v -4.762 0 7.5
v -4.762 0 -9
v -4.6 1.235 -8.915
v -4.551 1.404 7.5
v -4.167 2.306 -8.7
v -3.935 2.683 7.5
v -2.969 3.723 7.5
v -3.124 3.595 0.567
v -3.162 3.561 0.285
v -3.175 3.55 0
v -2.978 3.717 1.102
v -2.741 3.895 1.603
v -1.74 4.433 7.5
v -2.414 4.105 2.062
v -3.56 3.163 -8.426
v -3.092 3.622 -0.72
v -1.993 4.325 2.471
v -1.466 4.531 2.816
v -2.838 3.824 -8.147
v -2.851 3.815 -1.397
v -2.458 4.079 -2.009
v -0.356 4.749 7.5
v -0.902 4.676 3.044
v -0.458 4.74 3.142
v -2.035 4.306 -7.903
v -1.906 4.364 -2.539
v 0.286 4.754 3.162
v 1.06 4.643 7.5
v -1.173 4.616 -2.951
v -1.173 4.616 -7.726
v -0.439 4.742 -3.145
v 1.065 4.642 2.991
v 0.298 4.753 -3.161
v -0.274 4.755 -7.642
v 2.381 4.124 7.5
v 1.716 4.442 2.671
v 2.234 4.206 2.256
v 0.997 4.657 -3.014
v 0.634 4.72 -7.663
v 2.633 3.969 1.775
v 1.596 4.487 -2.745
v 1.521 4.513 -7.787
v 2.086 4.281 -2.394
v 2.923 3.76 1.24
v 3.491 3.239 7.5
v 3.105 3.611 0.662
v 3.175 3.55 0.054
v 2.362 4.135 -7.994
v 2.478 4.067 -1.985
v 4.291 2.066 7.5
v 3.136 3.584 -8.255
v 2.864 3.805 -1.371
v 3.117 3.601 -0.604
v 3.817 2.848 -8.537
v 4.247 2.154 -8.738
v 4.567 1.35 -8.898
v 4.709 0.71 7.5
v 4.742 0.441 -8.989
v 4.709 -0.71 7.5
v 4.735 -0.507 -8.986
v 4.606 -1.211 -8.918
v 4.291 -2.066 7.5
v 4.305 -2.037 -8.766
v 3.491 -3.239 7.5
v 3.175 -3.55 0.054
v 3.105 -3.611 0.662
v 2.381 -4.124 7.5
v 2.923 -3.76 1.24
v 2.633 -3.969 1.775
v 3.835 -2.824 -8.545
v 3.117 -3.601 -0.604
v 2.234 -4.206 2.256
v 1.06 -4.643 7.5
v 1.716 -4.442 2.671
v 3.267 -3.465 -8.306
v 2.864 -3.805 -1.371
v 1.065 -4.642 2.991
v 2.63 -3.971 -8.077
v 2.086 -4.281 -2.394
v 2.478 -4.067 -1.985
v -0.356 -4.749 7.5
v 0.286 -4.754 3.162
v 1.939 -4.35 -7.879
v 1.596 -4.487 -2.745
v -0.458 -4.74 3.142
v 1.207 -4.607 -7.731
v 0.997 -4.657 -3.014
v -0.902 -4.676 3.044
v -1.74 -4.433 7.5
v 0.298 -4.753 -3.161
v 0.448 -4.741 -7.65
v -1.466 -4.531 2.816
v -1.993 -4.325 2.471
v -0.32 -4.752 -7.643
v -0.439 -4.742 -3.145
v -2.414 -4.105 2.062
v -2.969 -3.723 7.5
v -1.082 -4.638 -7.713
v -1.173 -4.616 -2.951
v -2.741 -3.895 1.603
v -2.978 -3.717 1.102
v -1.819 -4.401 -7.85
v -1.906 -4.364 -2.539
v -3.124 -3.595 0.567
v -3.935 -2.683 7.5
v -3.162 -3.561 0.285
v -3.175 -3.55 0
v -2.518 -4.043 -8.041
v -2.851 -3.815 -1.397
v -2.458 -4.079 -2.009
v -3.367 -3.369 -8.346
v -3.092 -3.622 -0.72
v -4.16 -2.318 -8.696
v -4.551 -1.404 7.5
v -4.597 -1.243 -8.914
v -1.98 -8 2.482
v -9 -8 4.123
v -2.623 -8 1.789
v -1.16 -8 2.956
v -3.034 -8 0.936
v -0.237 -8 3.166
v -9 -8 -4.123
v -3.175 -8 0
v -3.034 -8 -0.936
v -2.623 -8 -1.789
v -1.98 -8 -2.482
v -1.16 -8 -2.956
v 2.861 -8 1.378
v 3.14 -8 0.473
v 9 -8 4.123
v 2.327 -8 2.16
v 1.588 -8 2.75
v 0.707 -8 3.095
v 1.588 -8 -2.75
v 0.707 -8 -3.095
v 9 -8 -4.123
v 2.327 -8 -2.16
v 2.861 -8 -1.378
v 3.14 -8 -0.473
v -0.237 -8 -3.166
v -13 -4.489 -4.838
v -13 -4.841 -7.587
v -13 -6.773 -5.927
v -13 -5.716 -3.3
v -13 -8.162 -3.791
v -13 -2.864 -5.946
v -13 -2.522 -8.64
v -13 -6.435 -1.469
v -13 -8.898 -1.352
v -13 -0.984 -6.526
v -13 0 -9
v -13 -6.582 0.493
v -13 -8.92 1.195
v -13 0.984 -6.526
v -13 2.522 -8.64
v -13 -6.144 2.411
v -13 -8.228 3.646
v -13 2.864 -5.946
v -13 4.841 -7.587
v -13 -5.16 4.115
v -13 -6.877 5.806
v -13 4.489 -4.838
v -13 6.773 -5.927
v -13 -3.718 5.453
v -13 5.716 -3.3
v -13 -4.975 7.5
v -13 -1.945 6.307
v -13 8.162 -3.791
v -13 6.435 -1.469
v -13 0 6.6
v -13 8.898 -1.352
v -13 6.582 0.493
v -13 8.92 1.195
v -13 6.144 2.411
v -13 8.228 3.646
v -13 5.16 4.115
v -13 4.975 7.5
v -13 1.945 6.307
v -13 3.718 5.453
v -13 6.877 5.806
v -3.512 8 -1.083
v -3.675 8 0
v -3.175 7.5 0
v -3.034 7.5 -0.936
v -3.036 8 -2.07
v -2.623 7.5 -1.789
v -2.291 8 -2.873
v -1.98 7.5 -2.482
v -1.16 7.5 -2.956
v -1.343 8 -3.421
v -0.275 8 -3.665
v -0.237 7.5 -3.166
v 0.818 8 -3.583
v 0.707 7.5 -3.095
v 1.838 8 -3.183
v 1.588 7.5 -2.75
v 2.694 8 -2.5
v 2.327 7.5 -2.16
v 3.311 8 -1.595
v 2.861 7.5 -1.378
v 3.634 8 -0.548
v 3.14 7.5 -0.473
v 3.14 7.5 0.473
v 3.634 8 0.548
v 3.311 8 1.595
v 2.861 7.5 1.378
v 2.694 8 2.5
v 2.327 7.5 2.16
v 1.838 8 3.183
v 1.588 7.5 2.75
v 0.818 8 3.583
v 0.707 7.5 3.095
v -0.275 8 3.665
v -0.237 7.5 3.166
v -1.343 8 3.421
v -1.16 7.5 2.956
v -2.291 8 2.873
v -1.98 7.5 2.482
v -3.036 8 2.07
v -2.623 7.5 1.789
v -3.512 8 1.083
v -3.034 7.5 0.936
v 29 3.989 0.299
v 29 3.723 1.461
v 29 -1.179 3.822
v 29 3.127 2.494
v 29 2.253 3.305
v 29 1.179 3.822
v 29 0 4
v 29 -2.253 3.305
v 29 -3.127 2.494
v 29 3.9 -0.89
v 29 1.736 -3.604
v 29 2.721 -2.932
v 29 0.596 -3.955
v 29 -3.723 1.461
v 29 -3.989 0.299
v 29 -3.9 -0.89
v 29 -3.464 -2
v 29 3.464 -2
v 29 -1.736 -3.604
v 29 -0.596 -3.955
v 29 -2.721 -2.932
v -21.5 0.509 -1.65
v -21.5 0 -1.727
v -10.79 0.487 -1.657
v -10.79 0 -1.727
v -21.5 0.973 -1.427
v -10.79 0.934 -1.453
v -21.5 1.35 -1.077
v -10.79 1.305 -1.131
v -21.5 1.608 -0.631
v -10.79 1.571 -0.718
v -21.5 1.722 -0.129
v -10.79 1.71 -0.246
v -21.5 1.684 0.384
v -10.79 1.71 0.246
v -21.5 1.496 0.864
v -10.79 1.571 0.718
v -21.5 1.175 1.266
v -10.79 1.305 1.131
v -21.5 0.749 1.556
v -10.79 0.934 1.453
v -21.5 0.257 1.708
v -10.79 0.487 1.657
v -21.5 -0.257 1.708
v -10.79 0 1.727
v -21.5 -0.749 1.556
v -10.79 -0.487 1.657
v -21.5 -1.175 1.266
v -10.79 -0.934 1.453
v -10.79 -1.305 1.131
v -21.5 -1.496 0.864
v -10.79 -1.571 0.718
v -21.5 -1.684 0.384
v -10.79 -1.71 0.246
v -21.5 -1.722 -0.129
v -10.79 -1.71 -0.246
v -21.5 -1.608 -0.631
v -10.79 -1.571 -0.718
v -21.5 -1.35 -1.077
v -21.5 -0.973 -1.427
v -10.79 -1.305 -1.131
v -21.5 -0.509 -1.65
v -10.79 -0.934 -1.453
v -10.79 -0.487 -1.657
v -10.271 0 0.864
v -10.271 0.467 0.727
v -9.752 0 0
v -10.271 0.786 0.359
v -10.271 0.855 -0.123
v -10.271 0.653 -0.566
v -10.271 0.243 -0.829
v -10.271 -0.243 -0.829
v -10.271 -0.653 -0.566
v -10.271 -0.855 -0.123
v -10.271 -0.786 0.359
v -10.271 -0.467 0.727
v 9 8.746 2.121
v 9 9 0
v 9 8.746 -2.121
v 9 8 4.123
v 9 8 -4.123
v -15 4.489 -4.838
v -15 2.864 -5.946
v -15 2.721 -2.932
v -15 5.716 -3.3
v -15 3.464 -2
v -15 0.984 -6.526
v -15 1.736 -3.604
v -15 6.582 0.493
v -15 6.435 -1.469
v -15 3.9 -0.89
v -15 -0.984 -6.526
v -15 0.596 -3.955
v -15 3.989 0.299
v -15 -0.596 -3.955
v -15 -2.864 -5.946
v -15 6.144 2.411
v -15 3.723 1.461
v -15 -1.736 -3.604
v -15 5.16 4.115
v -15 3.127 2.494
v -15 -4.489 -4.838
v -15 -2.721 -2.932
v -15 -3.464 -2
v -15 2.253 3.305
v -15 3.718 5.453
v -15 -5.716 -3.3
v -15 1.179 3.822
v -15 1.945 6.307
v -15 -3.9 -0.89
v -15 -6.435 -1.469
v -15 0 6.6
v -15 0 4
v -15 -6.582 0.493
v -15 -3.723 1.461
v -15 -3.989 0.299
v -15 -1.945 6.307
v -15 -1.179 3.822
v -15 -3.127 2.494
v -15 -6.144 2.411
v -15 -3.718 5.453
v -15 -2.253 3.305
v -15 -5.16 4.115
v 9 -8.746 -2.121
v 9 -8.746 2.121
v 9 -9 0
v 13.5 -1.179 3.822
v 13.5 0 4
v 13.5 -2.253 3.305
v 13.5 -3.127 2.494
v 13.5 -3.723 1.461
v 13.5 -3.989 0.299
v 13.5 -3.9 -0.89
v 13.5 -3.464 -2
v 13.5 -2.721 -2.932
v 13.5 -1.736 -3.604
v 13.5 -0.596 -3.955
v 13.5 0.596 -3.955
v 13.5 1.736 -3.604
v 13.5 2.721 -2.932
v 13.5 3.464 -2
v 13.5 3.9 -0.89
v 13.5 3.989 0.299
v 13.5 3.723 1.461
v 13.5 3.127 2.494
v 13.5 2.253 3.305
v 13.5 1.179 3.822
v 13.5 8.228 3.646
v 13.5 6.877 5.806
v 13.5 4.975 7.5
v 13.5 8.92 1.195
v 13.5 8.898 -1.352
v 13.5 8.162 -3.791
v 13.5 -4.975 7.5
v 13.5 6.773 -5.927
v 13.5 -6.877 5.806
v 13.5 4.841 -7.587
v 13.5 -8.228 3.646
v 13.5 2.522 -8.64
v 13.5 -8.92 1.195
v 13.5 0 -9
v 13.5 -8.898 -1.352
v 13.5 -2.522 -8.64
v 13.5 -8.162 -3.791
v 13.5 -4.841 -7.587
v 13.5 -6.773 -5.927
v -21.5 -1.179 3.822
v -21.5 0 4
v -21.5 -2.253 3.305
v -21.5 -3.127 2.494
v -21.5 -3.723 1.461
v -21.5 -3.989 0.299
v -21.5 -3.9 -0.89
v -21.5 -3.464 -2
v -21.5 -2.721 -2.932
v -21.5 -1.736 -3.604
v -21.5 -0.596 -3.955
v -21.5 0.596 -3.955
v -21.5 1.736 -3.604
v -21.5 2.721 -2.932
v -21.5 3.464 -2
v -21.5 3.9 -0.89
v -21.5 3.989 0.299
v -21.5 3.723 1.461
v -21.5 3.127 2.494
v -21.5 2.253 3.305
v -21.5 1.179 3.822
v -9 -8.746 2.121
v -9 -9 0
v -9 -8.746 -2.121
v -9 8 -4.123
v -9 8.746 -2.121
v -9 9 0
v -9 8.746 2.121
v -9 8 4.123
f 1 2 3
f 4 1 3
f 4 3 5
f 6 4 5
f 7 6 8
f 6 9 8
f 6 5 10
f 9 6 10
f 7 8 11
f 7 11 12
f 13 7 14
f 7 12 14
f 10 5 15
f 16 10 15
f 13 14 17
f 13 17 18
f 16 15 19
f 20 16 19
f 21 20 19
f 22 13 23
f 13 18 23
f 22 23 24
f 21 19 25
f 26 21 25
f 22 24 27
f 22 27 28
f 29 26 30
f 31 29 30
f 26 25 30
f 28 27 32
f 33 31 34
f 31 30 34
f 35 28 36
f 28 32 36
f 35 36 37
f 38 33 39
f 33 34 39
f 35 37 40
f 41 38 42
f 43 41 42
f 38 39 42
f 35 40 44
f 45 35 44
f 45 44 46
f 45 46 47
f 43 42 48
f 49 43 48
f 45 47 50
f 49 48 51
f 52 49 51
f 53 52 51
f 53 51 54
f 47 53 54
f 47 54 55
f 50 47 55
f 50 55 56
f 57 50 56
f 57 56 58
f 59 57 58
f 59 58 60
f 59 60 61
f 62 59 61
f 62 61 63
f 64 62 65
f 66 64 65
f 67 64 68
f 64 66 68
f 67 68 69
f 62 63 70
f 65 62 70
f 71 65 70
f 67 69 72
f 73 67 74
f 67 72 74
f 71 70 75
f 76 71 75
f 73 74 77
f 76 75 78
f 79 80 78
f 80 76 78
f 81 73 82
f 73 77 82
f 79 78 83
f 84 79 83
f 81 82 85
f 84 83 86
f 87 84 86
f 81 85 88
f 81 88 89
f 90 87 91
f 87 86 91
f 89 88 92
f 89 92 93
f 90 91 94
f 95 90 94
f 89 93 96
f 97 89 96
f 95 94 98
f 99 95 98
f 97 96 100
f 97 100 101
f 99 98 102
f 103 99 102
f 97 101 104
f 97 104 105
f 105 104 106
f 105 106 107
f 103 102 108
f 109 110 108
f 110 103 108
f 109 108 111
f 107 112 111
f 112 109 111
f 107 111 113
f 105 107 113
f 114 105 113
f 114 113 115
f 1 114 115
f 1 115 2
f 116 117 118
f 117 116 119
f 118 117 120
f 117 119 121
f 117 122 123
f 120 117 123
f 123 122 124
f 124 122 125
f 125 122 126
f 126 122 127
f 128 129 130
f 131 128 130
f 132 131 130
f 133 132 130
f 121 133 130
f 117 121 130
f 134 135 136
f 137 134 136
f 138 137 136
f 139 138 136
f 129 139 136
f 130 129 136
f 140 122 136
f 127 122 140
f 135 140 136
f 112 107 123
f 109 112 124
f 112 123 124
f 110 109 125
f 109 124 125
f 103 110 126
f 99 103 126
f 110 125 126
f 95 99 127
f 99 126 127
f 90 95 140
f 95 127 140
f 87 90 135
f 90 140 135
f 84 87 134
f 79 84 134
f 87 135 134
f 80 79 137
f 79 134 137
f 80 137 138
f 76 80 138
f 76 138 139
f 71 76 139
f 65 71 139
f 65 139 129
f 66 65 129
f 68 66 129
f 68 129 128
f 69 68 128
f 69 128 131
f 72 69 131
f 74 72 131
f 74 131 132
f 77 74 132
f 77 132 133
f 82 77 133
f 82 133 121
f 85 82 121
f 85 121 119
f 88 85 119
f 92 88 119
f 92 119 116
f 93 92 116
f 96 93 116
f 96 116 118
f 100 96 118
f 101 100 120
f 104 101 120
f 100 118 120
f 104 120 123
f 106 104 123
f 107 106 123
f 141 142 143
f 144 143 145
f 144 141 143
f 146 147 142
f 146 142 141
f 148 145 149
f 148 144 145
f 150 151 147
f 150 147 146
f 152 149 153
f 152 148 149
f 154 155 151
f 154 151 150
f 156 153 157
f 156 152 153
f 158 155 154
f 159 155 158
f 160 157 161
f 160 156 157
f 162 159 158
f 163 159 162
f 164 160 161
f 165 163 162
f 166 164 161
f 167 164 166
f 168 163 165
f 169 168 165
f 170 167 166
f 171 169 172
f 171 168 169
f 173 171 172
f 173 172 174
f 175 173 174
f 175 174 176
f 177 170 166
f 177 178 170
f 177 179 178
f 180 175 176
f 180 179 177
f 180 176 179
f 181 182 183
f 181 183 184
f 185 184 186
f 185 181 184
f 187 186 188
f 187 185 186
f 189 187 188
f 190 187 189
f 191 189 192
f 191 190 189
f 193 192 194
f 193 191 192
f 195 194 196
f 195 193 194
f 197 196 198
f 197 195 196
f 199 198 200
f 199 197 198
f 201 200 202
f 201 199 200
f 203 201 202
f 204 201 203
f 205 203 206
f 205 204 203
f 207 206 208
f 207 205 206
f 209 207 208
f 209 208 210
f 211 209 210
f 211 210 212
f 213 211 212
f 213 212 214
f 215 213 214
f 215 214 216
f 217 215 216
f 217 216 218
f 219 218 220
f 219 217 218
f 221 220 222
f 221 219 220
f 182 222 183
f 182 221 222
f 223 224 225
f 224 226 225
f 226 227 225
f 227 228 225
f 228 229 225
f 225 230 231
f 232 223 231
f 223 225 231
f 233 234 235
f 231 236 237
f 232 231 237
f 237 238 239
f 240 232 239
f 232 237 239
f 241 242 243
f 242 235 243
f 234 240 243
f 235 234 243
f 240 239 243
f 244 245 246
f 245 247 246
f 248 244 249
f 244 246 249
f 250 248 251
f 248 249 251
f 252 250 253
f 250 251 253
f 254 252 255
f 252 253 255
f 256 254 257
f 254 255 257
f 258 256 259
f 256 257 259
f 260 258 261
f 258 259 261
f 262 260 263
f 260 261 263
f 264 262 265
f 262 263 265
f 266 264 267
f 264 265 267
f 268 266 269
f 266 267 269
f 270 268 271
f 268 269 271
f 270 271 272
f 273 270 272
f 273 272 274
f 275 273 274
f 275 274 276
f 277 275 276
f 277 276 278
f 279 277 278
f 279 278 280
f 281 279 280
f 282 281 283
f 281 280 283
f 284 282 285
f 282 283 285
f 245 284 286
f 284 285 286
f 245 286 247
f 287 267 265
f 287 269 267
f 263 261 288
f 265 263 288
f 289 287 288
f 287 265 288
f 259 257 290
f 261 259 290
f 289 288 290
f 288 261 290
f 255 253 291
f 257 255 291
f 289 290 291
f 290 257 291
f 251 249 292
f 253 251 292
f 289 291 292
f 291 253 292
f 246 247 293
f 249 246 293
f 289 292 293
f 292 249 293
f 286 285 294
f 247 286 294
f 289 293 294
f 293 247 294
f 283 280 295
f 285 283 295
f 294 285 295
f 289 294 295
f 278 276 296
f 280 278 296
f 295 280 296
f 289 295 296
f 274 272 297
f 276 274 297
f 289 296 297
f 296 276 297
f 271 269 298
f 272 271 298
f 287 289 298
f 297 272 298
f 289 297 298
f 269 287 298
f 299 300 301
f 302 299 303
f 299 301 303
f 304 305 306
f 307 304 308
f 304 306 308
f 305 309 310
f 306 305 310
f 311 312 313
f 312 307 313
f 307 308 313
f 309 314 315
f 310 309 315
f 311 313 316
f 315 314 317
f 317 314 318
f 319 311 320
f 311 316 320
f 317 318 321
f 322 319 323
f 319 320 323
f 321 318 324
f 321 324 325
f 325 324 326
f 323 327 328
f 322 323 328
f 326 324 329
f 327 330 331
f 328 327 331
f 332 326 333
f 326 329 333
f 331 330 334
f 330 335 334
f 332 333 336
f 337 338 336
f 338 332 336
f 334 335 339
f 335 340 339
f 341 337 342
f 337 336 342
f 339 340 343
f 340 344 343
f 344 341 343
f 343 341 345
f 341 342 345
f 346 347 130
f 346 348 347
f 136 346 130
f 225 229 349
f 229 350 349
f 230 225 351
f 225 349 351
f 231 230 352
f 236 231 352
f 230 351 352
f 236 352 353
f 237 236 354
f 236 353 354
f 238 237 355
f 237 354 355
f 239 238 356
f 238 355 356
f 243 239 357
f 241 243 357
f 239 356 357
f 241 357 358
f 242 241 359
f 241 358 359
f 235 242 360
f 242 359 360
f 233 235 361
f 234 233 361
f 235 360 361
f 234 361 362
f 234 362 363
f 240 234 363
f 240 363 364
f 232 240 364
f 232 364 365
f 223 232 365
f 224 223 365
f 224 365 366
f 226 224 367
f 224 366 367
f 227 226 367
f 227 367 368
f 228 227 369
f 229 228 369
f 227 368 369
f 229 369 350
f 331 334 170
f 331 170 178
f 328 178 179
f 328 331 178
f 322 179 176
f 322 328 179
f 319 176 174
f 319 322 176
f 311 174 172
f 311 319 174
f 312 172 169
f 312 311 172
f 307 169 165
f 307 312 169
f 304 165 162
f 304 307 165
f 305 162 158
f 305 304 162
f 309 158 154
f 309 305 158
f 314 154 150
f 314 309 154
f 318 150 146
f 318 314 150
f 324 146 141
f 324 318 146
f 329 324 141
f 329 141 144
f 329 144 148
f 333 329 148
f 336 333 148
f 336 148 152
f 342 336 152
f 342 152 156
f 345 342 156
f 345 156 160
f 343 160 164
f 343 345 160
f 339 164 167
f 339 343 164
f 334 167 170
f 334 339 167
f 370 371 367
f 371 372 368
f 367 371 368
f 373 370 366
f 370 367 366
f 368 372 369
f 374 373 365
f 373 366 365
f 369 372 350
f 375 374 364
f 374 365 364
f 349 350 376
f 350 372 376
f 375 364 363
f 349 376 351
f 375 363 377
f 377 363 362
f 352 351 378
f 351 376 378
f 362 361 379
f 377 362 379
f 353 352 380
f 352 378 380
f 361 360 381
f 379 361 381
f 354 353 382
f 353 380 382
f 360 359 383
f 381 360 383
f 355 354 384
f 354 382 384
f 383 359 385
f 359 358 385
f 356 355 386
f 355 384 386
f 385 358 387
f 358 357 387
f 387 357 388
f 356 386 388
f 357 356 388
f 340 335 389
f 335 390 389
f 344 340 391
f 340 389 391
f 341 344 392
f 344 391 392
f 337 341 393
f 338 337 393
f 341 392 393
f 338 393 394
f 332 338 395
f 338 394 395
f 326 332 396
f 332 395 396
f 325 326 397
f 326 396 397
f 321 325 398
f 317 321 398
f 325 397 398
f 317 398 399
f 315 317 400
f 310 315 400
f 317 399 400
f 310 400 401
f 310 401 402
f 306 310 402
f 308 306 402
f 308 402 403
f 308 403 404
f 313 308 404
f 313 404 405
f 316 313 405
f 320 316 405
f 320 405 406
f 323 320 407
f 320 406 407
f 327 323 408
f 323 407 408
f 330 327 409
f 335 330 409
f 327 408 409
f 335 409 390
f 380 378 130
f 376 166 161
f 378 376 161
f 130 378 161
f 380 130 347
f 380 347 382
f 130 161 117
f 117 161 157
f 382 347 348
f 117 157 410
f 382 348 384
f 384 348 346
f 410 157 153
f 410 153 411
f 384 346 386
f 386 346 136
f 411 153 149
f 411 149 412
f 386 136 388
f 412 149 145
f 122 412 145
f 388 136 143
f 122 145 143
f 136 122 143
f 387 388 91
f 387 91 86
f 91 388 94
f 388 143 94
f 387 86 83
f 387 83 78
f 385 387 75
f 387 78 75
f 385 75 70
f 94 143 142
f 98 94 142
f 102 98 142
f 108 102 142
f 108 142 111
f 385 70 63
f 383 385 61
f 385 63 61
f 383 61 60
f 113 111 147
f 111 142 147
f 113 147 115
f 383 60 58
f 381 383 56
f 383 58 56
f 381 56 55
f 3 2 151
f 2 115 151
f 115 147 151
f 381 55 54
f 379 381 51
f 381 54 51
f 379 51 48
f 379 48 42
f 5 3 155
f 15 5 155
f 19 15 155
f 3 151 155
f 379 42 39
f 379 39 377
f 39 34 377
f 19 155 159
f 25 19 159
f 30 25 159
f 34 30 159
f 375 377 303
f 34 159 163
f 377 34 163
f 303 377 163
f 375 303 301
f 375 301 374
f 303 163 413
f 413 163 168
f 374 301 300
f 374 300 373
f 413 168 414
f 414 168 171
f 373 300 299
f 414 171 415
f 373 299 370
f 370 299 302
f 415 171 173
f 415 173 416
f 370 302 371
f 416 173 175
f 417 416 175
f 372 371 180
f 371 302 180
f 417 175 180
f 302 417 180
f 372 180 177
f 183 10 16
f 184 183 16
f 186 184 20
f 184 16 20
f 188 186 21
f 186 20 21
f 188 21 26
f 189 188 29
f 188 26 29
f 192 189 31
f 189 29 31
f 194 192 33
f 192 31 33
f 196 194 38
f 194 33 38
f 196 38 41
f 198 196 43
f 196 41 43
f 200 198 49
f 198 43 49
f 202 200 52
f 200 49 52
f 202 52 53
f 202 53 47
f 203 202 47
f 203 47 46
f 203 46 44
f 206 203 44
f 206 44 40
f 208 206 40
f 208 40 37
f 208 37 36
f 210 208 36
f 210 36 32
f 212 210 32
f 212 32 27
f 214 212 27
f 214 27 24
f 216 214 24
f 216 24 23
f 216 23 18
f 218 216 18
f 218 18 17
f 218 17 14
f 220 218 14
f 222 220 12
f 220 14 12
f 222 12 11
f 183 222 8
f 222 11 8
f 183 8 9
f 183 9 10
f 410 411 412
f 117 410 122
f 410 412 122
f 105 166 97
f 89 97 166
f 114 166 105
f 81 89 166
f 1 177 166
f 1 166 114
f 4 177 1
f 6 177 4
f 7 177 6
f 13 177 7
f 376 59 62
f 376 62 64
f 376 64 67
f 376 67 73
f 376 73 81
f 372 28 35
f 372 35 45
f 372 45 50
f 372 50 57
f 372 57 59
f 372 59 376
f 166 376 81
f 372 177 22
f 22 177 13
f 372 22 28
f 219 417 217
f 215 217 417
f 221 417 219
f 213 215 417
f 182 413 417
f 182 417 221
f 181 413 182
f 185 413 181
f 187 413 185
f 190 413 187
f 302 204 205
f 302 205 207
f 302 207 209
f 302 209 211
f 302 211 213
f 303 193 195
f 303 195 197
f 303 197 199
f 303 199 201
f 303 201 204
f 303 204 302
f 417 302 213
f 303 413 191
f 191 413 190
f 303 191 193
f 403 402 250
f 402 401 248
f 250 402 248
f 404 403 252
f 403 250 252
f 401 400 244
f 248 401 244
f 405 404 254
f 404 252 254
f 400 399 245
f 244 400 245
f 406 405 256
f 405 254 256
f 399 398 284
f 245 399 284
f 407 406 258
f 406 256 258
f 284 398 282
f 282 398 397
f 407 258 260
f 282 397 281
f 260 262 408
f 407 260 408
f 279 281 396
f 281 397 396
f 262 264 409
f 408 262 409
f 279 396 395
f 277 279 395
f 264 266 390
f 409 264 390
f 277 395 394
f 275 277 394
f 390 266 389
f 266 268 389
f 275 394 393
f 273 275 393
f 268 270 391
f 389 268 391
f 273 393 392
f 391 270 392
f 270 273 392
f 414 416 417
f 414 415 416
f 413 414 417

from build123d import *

# Parameters (mm, degrees)
SKETCH2_W                  = 30
SKETCH2_H                  = 12.7
CUT_EXTRUDE1_DEPTH         = 1.5
F_8_32_TAPPED_HOLE1_D      = 3.4544
F_8_32_TAPPED_HOLE1_DEPTH  = 10.71
F_8_32_TAPPED_HOLE1_TIP    = 1.037806461
SKETCH7_OUTSIDE_W          = 29.718
SKETCH7_OUTSIDE_H          = 31.218
SKETCH7_OUTSIDE_R          = 6.6
CUT_EXTRUDE2_DEPTH         = 2
F_3_8_0_3750_DOWEL_HOLE2_D = 9.525
CUT_EXTRUDE4_START         = 9
SKETCH11_W                 = 18
SKETCH11_H                 = 20
CUT_EXTRUDE4_DEPTH         = 1
F_1_4_0_2500_DOWEL_HOLE1_D = 6.35
CHAMFER1_SIZE              = 0.5


with BuildPart() as part:
    # Sketch1 → Revolve1 (revolve)
    with BuildSketch(Plane(origin=(0, 0, 0), x_dir=(1, 0, 0), z_dir=(0, 1, 0)), mode=Mode.PRIVATE) as revolve1_sk:
        Polygon((-21.5, 0), (29, 0), (29, 4), (13.5, 4), (13.5, 9), (-15, 9), (-15, 4), (-21.5, 4), align=None)
    revolve(revolve1_sk.sketch.rotate(Axis((-21.5, 0, 0), (1, 0, 0)), 180), axis=Axis((-21.5, 0, 0), (1, 0, 0)))

    # Sketch2 → Cut-Extrude1 (cut)
    with BuildSketch(Plane.XY.offset(9)):
        Rectangle(SKETCH2_W, SKETCH2_H)
    extrude(amount=-CUT_EXTRUDE1_DEPTH, mode=Mode.SUBTRACT)

    # #8-32 Tapped Hole1
    with Locations(Plane.ZY.offset(21.5)):
        with Locations((0, 0)):
            Hole(F_8_32_TAPPED_HOLE1_D / 2, depth=F_8_32_TAPPED_HOLE1_DEPTH)
            with Locations((0, 0, -(F_8_32_TAPPED_HOLE1_DEPTH + F_8_32_TAPPED_HOLE1_TIP / 2))):  # 118° drill point
                Cone(0, F_8_32_TAPPED_HOLE1_D / 2, F_8_32_TAPPED_HOLE1_TIP, mode=Mode.SUBTRACT)

    # Sketch7 outside → Cut-Extrude2 (cut)
    with BuildSketch(Plane.ZY.offset(15)):
        with Locations((-0.75, 0)):
            Rectangle(SKETCH7_OUTSIDE_W, SKETCH7_OUTSIDE_H)
        Circle(SKETCH7_OUTSIDE_R, mode=Mode.SUBTRACT)
    extrude(amount=-CUT_EXTRUDE2_DEPTH, mode=Mode.SUBTRACT)

    # 3/8 (0.3750) Dowel Hole2 (through all)
    with Locations(Plane.XY.offset(7.5)):
        with Locations((0, 0)):
            Hole(F_3_8_0_3750_DOWEL_HOLE2_D / 2)

    # Sketch11 → Cut-Extrude4 (cut)
    with BuildSketch(Plane(origin=(0, 0, 0), x_dir=(1, 0, 0), z_dir=(0, 1, 0)).offset(CUT_EXTRUDE4_START)):
        Rectangle(SKETCH11_W, SKETCH11_H)
    cut_extrude4 = extrude(amount=-CUT_EXTRUDE4_DEPTH, mode=Mode.SUBTRACT)

    # 1/4 (0.2500) Dowel Hole1 (through all)
    with Locations(Plane(origin=(0, 8, 0), x_dir=(1, 0, 0), z_dir=(0, 1, 0))):
        with Locations((0, 0)):
            Hole(F_1_4_0_2500_DOWEL_HOLE1_D / 2)

    # Mirror1: Cut-Extrude4 across plane
    add(cut_extrude4.mirror(Plane.ZX), mode=Mode.SUBTRACT)

    # Chamfer1
    chamfer1_edges = [part.edges().sort_by_distance(p)[0] for p in [
        (3.175, 8, 0),
    ]]
    chamfer(chamfer1_edges, length=CHAMFER1_SIZE)


solid = part.part
